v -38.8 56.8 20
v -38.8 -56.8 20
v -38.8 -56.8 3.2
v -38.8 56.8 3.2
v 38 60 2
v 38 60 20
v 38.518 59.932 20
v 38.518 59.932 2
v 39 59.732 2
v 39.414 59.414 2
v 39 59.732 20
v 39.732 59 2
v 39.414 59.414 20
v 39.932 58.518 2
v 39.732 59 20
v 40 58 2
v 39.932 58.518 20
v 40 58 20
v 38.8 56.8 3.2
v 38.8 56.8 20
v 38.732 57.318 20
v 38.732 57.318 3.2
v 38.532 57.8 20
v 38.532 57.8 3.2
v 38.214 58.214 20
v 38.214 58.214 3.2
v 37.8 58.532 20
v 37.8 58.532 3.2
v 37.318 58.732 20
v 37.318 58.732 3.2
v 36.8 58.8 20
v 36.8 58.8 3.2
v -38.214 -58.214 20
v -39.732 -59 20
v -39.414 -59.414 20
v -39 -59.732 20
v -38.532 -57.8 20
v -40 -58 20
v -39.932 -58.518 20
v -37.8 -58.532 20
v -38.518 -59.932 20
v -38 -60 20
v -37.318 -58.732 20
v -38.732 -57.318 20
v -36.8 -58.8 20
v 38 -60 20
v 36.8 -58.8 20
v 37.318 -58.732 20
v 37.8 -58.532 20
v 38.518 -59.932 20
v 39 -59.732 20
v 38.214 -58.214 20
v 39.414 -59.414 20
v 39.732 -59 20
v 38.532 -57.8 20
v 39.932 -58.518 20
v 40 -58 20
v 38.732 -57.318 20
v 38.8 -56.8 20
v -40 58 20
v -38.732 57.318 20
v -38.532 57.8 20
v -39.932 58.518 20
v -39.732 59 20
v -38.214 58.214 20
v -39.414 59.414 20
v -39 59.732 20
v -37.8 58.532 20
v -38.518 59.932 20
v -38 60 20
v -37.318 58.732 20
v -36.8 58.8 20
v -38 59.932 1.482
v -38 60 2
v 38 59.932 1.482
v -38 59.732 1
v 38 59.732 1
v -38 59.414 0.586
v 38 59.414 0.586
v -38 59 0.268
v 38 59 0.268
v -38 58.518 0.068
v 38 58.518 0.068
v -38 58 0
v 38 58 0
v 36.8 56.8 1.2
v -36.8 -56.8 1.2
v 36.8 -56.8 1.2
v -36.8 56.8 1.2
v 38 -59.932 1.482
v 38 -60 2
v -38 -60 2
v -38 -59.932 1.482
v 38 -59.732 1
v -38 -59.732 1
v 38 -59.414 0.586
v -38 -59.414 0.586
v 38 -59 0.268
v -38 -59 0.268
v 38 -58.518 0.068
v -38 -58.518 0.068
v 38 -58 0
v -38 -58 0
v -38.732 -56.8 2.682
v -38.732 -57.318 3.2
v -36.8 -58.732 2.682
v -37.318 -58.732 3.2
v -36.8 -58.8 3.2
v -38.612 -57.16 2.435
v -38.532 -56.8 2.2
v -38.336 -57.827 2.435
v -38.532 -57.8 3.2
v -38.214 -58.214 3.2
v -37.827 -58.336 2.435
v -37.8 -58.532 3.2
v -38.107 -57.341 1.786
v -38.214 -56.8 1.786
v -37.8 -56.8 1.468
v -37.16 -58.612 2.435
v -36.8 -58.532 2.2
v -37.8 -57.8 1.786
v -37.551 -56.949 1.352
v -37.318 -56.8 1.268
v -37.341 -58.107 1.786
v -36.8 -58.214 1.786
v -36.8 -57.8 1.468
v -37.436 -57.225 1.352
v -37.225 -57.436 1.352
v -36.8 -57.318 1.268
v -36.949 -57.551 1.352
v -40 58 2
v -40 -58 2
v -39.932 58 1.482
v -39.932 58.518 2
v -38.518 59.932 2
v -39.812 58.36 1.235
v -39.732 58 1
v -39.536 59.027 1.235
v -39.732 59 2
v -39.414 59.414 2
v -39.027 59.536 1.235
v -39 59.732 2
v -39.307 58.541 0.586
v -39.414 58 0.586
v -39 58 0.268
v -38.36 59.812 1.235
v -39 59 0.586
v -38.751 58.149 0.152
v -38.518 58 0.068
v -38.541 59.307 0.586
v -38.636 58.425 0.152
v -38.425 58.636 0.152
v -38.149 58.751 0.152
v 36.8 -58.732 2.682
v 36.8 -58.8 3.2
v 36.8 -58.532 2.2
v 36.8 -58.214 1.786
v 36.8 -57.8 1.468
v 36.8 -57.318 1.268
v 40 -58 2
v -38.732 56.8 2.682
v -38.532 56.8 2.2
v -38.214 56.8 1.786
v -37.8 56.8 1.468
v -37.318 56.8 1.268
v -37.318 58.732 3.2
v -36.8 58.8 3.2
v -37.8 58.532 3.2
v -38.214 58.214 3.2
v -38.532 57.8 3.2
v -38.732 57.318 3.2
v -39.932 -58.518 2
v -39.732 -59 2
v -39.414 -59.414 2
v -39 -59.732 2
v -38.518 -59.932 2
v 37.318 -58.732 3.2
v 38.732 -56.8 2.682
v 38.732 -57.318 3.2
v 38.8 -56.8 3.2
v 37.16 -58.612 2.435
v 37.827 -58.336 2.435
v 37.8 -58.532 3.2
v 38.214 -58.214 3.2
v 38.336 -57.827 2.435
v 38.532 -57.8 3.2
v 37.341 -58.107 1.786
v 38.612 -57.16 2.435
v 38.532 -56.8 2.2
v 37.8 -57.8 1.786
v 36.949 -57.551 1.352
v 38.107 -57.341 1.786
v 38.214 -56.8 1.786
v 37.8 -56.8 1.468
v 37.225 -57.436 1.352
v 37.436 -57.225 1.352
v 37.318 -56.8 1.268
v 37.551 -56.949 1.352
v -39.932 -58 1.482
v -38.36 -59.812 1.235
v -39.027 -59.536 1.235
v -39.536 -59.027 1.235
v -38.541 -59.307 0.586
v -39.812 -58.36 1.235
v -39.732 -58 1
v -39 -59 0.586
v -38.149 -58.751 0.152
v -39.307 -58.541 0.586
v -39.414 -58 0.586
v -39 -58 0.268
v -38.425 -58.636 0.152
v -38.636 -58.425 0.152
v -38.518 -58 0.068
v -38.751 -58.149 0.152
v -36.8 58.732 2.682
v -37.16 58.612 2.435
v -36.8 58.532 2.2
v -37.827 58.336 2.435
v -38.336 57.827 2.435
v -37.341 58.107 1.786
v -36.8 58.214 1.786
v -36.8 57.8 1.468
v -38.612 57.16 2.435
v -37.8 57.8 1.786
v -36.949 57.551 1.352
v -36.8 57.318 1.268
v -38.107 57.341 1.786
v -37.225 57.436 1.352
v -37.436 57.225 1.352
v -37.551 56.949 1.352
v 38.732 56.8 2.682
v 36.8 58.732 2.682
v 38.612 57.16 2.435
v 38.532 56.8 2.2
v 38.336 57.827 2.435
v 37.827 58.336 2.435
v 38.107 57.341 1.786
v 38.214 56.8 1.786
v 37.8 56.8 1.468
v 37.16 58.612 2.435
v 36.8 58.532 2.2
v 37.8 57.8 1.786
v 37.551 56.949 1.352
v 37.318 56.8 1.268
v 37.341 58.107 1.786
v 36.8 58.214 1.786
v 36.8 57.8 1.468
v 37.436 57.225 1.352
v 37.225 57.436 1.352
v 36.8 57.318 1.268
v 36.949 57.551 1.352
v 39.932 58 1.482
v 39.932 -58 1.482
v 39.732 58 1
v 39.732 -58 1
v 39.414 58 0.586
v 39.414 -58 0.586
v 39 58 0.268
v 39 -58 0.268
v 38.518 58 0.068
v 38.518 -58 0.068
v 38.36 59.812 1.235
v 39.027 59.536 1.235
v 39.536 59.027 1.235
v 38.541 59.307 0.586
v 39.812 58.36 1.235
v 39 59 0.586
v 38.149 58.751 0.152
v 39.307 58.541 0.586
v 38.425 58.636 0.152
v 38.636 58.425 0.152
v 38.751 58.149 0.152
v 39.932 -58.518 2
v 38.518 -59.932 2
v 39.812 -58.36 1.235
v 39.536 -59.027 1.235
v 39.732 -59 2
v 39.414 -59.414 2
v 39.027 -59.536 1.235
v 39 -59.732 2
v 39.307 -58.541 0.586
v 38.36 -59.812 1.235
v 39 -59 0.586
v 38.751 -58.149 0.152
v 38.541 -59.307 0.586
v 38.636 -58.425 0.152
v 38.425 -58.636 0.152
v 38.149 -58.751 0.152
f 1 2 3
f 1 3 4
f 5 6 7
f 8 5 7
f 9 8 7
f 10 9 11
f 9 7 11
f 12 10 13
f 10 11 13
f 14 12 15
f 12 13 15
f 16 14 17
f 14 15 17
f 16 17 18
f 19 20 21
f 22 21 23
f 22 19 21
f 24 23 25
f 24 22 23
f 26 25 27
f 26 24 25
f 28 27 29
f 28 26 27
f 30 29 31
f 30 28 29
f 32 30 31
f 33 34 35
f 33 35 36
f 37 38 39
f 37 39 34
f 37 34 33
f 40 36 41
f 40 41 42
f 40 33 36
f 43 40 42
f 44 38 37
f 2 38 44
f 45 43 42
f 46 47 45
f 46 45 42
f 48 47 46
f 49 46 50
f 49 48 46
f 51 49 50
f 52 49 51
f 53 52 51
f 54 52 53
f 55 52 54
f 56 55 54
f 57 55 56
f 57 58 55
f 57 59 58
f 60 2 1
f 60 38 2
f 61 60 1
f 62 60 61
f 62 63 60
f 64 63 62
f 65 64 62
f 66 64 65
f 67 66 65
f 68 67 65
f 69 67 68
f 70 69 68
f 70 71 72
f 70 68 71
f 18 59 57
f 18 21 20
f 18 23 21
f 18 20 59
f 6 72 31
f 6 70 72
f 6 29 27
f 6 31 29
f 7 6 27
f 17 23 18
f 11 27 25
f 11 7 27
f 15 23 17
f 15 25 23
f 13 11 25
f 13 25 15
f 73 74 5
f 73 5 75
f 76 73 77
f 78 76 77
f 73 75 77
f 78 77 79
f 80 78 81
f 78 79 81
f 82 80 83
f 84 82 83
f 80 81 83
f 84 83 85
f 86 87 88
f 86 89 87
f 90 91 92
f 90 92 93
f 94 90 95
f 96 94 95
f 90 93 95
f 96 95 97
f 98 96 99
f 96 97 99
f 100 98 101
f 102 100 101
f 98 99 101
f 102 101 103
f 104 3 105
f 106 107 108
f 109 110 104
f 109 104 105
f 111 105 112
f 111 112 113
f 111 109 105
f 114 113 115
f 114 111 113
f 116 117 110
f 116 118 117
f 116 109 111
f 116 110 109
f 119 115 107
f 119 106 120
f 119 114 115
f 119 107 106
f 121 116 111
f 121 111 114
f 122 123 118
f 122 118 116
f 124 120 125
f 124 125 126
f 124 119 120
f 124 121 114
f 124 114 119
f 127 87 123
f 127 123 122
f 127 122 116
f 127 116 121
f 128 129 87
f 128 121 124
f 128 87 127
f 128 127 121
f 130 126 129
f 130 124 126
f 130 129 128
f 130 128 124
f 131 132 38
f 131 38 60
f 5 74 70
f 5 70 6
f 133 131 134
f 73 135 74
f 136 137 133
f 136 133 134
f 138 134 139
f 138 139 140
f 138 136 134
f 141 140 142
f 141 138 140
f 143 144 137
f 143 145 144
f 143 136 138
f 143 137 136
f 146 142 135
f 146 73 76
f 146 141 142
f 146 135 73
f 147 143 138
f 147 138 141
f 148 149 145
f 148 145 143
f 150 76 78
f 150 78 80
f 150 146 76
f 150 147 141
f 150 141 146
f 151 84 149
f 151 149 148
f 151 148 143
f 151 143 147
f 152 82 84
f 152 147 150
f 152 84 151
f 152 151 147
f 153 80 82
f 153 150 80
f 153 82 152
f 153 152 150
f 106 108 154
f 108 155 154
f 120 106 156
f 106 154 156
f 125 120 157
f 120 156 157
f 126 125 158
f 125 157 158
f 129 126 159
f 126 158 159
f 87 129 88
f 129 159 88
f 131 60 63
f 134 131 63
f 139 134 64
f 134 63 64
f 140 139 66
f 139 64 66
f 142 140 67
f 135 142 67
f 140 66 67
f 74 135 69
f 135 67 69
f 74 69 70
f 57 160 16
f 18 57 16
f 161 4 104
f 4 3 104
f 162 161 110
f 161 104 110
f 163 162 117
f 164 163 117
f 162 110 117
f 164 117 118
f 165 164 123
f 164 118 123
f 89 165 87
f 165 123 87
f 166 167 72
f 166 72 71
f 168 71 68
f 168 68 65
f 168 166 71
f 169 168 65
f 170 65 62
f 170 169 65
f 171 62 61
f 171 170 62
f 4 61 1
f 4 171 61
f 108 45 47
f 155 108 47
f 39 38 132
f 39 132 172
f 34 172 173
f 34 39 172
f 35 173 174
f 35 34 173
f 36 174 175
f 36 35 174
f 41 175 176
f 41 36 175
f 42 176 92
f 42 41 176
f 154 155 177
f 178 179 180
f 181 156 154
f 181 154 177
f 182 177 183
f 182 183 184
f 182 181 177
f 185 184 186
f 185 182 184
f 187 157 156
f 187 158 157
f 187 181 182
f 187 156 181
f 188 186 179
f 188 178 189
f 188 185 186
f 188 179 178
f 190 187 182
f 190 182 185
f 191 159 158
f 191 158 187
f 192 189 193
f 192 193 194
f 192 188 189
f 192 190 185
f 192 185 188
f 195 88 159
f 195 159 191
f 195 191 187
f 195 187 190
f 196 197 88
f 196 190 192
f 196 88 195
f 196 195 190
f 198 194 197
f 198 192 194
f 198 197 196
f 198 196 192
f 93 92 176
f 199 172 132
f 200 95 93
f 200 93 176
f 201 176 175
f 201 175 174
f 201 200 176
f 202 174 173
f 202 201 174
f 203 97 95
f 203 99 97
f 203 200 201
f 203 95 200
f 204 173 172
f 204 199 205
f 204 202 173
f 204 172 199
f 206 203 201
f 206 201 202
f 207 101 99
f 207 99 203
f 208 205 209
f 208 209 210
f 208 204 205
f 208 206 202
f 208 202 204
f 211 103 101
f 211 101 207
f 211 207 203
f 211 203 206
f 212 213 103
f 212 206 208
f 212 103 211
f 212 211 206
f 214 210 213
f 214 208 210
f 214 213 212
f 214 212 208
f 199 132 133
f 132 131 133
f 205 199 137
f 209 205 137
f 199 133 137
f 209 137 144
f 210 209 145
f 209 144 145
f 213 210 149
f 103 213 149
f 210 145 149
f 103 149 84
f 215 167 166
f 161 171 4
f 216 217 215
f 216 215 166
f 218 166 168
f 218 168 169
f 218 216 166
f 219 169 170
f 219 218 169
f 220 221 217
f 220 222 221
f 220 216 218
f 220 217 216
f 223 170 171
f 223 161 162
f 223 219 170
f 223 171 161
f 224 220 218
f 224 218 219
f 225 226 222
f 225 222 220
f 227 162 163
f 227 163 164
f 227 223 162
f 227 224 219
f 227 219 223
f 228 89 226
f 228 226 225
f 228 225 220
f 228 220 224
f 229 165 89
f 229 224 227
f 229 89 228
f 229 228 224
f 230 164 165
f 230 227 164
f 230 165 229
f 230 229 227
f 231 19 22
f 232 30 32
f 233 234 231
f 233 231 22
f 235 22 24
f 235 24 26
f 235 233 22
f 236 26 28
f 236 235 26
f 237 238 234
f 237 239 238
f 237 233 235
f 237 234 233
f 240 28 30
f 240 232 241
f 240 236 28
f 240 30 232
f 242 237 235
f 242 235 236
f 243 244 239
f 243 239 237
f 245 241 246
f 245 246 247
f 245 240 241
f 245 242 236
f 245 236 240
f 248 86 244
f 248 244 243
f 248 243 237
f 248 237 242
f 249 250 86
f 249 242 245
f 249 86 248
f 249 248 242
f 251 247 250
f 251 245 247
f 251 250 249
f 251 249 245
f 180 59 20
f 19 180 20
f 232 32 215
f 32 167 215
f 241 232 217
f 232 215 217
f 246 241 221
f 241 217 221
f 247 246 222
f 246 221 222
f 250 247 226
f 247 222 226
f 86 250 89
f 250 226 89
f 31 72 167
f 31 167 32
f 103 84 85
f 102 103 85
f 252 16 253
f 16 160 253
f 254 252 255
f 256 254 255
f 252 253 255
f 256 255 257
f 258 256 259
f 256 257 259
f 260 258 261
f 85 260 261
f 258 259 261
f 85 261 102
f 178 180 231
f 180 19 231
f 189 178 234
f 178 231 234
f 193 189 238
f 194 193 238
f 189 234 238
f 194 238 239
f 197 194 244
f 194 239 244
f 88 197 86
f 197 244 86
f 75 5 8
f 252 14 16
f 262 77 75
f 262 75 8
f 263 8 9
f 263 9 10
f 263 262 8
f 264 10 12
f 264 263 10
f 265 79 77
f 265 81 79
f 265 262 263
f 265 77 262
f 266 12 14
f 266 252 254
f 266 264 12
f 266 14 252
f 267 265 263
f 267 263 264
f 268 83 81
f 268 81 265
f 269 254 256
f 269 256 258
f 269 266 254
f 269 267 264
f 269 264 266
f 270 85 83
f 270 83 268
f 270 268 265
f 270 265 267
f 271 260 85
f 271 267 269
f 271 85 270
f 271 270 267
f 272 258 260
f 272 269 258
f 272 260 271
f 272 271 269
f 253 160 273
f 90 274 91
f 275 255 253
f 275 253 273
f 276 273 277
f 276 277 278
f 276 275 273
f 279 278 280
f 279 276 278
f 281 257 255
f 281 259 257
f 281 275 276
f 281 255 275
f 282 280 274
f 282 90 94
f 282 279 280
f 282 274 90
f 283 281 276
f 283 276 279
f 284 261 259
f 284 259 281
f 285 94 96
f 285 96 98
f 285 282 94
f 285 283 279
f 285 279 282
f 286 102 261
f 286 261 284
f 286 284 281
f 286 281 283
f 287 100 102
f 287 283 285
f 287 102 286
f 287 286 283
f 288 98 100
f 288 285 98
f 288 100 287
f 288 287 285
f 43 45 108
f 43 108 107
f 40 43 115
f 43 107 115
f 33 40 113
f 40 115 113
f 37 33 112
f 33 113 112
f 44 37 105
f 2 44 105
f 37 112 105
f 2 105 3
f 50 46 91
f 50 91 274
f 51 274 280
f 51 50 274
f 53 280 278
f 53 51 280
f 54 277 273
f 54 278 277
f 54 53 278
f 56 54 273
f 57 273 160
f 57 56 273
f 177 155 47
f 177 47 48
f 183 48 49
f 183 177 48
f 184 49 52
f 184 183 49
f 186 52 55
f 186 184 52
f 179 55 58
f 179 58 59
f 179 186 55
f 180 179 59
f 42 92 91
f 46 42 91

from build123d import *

# Parameters (mm, degrees)
F0_W     = 80
F0_H     = 120
F1_DEPTH = 20
F2_W     = 77.6
F2_H     = 117.6
F3_DEPTH = 18.8
F4_R     = 2
F5_R     = 2
F6_R     = 2
F7_R     = 2


with BuildPart() as f1:
    # F0 (on Top) → F1 (new body)
    with BuildSketch(Plane.XY):
        Rectangle(F0_W, F0_H)
    extrude(amount=F1_DEPTH)

    # F2 (on face) → F3 (cut)
    with BuildSketch(Plane.XY.offset(20)):
        Rectangle(F2_W, F2_H)
    extrude(amount=-F3_DEPTH, mode=Mode.SUBTRACT)

    # F4
    f4_edges = [f1.edges().sort_by_distance(p)[0] for p in [
        (40, -60, 10),
        (40, 60, 10),
        (-40, -60, 10),
        (-40, 60, 10),
    ]]
    fillet(f4_edges, radius=F4_R)

    # F5
    f5_edges = [f1.edges().sort_by_distance(p)[0] for p in [
        (-38.8, 58.8, 10.6),
        (-38.8, -58.8, 10.6),
        (38.8, -58.8, 10.6),
        (38.8, 58.8, 10.6),
    ]]
    fillet(f5_edges, radius=F5_R)

    # F6
    f6_edges = [f1.edges().sort_by_distance(p)[0] for p in [
        (0, -58.8, 1.2),
        (-38.214214, -58.214214, 1.2),
        (38.214214, -58.214214, 1.2),
        (-38.8, 0, 1.2),
        (38.8, 0, 1.2),
        (-38.214214, 58.214214, 1.2),
        (38.214214, 58.214214, 1.2),
        (0, 58.8, 1.2),
    ]]
    fillet(f6_edges, radius=F6_R)

    # F7
    f7_edges = [f1.edges().sort_by_distance(p)[0] for p in [
        (-40, 0, 0),
        (-39.414214, 59.414214, 0),
        (-39.414214, -59.414214, 0),
        (0, 60, 0),
        (0, -60, 0),
        (39.414214, 59.414214, 0),
        (39.414214, -59.414214, 0),
        (40, 0, 0),
    ]]
    fillet(f7_edges, radius=F7_R)


solid = f1.part
